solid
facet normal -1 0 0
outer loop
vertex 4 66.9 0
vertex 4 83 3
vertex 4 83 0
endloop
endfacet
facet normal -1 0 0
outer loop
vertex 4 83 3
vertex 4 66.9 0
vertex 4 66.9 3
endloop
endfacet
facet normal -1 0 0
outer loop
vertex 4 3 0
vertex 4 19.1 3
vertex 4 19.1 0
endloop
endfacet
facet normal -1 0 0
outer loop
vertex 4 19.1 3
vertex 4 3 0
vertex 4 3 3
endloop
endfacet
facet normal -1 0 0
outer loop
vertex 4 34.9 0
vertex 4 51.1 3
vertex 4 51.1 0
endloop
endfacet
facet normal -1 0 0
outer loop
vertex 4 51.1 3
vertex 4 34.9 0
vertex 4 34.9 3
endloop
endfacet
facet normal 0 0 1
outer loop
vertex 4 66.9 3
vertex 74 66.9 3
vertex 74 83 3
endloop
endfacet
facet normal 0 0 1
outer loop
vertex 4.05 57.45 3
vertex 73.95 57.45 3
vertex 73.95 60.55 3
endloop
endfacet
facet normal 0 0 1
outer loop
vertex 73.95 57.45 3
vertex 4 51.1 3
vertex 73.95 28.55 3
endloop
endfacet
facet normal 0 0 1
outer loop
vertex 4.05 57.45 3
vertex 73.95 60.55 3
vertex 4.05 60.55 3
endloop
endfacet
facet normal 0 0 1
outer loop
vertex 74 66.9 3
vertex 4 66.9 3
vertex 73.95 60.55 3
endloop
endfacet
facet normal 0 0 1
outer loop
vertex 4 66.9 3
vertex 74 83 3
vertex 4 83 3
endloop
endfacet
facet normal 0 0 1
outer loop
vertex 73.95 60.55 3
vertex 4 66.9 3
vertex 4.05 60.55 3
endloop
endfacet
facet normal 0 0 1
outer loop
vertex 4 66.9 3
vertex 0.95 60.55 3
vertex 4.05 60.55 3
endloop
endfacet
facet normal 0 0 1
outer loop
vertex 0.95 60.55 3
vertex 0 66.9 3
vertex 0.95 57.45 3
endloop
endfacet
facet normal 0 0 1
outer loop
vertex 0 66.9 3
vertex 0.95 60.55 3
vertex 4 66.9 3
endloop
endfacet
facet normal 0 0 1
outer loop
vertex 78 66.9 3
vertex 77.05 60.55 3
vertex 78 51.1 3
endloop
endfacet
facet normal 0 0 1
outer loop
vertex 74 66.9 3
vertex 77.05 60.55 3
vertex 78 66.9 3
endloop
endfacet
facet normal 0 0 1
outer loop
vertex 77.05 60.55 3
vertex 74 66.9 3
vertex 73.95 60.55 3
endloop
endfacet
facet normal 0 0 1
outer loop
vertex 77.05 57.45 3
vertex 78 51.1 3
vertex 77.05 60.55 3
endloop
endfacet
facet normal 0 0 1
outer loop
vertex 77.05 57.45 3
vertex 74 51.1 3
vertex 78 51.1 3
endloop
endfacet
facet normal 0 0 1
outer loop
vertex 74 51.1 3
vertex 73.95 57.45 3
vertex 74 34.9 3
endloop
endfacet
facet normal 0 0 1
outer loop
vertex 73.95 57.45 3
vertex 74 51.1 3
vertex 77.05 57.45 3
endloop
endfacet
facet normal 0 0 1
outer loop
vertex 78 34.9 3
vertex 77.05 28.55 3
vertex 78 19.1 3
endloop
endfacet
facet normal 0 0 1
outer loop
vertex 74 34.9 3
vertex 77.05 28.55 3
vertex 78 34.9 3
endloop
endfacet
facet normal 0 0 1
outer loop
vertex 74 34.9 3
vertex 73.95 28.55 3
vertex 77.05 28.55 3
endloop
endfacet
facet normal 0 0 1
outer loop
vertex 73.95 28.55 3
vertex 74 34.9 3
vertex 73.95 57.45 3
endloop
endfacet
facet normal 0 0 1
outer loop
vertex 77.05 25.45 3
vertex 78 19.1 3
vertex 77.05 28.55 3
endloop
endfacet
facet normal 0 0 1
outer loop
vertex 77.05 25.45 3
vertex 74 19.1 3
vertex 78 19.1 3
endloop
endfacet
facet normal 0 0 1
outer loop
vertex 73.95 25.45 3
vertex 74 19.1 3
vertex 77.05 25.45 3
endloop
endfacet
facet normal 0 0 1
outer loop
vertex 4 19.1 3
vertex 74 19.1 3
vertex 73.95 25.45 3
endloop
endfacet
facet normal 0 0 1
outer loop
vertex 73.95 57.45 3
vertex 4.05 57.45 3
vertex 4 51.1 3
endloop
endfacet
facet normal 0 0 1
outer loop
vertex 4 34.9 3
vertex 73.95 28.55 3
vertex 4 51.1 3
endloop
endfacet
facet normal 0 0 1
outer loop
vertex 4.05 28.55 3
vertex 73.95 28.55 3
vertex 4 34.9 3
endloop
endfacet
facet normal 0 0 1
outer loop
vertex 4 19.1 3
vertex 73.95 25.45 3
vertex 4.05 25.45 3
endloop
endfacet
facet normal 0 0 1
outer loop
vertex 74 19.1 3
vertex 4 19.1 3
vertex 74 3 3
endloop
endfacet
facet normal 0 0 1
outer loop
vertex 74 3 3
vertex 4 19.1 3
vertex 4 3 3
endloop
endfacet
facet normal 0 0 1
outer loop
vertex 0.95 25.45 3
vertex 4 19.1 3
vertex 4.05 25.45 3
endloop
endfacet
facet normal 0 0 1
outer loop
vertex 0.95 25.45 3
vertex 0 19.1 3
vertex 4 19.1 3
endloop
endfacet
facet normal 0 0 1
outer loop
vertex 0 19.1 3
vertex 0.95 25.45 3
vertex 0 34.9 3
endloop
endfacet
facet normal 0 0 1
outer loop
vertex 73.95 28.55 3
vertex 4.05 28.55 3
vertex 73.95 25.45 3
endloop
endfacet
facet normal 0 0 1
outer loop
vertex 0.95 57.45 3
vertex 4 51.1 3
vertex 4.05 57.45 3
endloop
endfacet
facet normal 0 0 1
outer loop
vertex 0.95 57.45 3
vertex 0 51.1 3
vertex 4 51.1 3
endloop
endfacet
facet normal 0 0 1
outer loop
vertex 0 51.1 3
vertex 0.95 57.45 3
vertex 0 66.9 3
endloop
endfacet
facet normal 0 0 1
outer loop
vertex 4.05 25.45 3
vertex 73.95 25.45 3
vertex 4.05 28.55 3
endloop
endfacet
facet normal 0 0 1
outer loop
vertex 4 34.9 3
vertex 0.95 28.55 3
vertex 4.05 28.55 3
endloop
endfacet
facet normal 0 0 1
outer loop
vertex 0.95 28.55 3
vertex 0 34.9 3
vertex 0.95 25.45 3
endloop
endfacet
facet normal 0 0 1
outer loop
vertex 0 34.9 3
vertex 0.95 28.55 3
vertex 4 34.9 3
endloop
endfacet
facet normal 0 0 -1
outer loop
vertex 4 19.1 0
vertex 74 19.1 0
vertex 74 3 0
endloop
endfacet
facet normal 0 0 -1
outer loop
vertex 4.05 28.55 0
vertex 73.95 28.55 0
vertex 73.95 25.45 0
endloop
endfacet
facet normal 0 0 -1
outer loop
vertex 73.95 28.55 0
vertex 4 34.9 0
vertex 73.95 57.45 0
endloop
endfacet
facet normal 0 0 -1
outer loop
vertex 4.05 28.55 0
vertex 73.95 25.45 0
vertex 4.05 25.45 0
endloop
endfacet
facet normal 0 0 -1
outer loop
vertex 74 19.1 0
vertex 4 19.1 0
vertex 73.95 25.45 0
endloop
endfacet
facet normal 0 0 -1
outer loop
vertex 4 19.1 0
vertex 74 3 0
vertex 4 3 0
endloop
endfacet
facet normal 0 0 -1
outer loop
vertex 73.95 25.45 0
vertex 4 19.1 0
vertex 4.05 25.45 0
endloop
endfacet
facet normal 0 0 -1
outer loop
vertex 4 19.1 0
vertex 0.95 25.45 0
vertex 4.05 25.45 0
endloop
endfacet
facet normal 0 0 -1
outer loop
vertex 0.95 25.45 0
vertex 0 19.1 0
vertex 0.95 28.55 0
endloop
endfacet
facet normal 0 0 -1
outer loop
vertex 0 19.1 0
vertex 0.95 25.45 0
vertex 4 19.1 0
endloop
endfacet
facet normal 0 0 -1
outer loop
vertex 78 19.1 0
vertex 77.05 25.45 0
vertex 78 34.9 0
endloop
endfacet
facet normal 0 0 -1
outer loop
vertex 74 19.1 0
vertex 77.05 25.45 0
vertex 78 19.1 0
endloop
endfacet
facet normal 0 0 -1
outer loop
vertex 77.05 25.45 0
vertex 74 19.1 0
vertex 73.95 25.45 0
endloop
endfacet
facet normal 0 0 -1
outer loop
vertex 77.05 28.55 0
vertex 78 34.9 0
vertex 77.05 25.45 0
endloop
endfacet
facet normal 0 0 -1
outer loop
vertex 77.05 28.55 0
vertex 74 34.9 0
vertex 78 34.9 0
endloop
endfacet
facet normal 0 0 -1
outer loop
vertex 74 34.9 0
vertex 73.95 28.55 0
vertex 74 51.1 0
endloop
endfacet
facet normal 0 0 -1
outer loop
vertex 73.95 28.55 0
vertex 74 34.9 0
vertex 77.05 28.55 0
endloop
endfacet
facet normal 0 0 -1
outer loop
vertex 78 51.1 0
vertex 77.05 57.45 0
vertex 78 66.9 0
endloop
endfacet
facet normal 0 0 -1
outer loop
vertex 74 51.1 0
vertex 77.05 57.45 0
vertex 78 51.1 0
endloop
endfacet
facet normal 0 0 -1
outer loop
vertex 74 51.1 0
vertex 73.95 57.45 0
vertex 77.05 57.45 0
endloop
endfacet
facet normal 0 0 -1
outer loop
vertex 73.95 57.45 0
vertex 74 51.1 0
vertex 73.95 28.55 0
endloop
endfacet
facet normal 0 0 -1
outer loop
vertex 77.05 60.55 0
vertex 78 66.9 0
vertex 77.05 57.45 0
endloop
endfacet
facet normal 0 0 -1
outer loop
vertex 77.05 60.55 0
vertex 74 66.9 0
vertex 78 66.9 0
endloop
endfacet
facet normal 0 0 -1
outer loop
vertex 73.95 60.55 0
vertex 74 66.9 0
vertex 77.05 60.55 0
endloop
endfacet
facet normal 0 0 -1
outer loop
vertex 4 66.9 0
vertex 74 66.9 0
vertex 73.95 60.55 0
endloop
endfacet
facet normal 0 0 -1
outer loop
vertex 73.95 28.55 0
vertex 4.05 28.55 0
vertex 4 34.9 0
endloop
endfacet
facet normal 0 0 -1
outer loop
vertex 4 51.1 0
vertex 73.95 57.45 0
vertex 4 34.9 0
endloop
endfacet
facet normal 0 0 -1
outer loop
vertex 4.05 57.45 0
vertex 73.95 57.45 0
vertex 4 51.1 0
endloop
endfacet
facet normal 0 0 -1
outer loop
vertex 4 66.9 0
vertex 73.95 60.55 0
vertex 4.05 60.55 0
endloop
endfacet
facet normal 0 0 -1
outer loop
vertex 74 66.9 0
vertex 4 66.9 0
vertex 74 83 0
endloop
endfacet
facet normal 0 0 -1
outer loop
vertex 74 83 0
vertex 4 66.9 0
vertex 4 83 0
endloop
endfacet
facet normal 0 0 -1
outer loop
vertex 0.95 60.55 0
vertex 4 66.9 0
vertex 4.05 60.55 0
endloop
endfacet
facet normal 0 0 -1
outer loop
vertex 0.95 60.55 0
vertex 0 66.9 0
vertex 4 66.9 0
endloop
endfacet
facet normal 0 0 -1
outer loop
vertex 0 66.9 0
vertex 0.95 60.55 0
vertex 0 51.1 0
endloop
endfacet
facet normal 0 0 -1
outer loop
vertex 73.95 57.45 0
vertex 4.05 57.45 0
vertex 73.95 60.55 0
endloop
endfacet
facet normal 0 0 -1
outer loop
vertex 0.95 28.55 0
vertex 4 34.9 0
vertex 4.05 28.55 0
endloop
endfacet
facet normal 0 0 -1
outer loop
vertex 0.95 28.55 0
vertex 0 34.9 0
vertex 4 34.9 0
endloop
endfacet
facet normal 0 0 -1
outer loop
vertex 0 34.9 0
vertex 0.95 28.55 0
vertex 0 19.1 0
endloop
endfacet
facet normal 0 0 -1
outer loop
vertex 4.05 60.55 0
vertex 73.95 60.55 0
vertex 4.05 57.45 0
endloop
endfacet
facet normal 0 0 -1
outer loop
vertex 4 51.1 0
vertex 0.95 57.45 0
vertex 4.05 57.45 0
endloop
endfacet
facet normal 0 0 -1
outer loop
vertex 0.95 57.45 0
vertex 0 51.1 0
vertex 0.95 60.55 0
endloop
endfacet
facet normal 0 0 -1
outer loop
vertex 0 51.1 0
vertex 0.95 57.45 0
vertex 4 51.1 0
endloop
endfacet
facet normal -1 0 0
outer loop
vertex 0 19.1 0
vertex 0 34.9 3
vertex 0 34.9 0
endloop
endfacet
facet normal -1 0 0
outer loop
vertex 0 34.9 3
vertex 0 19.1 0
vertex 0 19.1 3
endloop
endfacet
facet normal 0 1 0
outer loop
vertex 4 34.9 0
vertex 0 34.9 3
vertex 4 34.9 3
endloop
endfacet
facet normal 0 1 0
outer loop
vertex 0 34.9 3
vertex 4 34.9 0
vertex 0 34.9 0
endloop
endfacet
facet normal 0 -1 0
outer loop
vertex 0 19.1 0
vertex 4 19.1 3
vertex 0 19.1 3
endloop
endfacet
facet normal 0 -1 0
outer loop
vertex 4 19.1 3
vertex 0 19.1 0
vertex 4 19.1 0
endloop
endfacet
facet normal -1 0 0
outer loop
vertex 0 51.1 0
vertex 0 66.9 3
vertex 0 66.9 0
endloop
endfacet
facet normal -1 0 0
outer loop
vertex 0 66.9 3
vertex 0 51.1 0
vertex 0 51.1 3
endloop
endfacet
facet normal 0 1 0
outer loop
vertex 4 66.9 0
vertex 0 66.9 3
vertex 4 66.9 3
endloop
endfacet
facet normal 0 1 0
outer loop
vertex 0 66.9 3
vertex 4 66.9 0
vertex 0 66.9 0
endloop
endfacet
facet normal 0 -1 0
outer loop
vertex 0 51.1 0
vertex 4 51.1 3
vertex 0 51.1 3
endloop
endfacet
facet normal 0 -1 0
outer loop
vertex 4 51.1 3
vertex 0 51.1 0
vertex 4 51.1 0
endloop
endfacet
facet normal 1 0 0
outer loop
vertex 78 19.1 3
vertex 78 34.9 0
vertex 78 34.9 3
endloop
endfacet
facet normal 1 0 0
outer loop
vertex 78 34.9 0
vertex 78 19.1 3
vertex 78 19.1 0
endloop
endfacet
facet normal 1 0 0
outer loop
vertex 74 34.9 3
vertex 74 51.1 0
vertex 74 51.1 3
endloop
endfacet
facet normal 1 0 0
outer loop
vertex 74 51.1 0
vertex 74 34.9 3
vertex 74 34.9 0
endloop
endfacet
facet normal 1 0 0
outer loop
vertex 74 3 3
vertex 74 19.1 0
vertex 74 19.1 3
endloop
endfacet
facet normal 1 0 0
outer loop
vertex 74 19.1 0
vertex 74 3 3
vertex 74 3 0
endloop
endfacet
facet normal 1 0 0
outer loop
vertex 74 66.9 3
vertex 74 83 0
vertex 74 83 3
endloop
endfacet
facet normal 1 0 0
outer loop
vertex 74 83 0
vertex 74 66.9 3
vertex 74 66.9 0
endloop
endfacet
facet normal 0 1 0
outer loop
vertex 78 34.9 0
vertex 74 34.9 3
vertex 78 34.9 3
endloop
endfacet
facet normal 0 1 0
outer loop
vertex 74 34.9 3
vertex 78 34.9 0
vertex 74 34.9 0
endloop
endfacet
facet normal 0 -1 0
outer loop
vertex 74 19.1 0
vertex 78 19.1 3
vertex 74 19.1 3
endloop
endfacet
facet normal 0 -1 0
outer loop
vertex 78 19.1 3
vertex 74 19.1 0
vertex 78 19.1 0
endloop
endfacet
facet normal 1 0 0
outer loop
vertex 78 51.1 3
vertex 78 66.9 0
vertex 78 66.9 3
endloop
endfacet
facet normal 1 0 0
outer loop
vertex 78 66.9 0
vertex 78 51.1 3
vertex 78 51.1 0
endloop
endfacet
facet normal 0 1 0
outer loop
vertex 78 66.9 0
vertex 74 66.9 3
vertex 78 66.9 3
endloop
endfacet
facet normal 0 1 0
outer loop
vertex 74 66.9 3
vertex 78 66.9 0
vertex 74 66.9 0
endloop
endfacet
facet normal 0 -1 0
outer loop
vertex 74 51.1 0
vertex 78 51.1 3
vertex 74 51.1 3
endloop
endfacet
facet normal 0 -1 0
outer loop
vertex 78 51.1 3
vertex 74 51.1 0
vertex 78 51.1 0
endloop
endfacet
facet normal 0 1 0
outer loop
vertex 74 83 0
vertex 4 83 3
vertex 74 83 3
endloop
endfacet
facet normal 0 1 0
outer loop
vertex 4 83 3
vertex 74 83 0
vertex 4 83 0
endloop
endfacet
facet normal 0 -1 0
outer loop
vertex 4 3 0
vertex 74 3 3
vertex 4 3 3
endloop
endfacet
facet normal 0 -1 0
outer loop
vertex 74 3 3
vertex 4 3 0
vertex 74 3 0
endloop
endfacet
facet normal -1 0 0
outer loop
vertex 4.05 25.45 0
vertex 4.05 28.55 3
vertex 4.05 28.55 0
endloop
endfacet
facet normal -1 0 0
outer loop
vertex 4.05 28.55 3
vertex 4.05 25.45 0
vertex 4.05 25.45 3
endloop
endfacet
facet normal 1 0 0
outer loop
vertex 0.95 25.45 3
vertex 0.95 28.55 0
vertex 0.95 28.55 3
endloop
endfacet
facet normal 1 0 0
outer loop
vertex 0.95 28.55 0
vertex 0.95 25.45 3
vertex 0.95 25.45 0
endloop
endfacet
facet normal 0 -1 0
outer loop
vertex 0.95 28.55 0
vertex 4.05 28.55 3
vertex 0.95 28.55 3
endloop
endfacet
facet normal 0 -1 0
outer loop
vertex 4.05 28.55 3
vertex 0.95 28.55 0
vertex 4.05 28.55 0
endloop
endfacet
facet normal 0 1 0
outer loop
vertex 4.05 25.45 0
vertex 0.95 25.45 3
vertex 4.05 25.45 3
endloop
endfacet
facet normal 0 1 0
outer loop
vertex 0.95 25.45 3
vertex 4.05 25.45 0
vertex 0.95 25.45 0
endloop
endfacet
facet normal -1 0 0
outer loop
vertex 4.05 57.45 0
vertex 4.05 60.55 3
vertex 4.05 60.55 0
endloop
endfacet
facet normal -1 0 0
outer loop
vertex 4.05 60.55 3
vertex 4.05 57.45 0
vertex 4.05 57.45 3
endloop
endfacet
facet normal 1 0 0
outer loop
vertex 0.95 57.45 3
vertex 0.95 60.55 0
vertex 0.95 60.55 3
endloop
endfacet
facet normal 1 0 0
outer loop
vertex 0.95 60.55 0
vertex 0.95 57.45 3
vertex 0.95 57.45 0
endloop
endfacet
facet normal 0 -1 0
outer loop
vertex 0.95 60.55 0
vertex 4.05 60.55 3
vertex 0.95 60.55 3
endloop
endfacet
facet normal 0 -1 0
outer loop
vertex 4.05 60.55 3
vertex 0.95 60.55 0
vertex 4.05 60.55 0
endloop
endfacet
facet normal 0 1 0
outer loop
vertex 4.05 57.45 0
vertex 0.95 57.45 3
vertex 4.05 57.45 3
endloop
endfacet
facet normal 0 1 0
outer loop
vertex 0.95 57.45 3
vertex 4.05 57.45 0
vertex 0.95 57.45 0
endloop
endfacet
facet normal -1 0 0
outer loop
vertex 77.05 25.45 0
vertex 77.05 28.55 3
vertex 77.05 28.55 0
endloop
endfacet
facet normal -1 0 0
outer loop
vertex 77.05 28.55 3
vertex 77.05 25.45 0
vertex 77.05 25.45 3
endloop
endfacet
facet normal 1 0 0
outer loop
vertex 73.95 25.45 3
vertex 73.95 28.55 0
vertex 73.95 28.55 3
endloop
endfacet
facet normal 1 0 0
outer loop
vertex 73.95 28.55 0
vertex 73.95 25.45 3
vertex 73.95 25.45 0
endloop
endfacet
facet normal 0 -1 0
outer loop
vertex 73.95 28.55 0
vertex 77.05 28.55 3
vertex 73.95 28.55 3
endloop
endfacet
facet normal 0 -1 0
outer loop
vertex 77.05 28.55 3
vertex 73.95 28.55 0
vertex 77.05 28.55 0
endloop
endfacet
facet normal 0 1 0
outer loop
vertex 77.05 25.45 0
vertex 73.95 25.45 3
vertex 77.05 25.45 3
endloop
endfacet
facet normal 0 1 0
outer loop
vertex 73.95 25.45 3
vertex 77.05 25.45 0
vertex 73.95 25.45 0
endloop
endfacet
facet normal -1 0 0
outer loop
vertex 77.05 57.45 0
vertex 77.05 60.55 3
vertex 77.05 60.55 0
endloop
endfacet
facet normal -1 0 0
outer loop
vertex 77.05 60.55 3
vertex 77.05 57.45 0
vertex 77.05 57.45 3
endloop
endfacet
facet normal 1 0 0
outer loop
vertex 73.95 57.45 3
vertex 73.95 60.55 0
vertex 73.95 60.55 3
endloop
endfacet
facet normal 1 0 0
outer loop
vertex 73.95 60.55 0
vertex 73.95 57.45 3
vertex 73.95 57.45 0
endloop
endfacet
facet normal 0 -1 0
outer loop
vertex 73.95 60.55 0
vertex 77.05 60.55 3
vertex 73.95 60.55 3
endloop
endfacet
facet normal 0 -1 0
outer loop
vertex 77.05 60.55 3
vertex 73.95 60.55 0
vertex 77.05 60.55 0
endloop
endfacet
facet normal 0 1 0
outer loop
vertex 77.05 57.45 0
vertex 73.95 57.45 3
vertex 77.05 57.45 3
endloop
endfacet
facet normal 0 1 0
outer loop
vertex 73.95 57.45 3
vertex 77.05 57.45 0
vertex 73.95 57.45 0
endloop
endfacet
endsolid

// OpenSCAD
lct = 3; // Laser Cut thickness
dim_x = 86-5-5;//reduced by 10 mm
dim_y= 86;
tol = .1;//tolerance for teeth
teeth_extend = 1;
h_tol=.05;//hole tolerance
difference(){

translate([teeth_extend,0,0])
union(){
translate([lct,lct,0])cube([dim_x-2*lct,dim_y-2*lct,lct]);//the cube
for(y=[lct+16+tol:32:dim_y-2*lct])translate([0-teeth_extend,y,0])cube([lct+teeth_extend,16-2*tol,lct]);//teeth left
for(y=[lct+16+tol:32:dim_y-2*lct])translate([dim_x-lct,y,0])cube([lct+teeth_extend,16-2*tol,lct]);//teeth right
}
translate([teeth_extend,0,0])
union(){
for(x=[0-h_tol,dim_x-lct-h_tol])for(y=[lct+16+((16-lct)/2)-h_tol:32:dim_y])translate([x,y,0])cube([lct+2*h_tol,lct+2*h_tol,lct]);//screw_head 4 holes
}
}
